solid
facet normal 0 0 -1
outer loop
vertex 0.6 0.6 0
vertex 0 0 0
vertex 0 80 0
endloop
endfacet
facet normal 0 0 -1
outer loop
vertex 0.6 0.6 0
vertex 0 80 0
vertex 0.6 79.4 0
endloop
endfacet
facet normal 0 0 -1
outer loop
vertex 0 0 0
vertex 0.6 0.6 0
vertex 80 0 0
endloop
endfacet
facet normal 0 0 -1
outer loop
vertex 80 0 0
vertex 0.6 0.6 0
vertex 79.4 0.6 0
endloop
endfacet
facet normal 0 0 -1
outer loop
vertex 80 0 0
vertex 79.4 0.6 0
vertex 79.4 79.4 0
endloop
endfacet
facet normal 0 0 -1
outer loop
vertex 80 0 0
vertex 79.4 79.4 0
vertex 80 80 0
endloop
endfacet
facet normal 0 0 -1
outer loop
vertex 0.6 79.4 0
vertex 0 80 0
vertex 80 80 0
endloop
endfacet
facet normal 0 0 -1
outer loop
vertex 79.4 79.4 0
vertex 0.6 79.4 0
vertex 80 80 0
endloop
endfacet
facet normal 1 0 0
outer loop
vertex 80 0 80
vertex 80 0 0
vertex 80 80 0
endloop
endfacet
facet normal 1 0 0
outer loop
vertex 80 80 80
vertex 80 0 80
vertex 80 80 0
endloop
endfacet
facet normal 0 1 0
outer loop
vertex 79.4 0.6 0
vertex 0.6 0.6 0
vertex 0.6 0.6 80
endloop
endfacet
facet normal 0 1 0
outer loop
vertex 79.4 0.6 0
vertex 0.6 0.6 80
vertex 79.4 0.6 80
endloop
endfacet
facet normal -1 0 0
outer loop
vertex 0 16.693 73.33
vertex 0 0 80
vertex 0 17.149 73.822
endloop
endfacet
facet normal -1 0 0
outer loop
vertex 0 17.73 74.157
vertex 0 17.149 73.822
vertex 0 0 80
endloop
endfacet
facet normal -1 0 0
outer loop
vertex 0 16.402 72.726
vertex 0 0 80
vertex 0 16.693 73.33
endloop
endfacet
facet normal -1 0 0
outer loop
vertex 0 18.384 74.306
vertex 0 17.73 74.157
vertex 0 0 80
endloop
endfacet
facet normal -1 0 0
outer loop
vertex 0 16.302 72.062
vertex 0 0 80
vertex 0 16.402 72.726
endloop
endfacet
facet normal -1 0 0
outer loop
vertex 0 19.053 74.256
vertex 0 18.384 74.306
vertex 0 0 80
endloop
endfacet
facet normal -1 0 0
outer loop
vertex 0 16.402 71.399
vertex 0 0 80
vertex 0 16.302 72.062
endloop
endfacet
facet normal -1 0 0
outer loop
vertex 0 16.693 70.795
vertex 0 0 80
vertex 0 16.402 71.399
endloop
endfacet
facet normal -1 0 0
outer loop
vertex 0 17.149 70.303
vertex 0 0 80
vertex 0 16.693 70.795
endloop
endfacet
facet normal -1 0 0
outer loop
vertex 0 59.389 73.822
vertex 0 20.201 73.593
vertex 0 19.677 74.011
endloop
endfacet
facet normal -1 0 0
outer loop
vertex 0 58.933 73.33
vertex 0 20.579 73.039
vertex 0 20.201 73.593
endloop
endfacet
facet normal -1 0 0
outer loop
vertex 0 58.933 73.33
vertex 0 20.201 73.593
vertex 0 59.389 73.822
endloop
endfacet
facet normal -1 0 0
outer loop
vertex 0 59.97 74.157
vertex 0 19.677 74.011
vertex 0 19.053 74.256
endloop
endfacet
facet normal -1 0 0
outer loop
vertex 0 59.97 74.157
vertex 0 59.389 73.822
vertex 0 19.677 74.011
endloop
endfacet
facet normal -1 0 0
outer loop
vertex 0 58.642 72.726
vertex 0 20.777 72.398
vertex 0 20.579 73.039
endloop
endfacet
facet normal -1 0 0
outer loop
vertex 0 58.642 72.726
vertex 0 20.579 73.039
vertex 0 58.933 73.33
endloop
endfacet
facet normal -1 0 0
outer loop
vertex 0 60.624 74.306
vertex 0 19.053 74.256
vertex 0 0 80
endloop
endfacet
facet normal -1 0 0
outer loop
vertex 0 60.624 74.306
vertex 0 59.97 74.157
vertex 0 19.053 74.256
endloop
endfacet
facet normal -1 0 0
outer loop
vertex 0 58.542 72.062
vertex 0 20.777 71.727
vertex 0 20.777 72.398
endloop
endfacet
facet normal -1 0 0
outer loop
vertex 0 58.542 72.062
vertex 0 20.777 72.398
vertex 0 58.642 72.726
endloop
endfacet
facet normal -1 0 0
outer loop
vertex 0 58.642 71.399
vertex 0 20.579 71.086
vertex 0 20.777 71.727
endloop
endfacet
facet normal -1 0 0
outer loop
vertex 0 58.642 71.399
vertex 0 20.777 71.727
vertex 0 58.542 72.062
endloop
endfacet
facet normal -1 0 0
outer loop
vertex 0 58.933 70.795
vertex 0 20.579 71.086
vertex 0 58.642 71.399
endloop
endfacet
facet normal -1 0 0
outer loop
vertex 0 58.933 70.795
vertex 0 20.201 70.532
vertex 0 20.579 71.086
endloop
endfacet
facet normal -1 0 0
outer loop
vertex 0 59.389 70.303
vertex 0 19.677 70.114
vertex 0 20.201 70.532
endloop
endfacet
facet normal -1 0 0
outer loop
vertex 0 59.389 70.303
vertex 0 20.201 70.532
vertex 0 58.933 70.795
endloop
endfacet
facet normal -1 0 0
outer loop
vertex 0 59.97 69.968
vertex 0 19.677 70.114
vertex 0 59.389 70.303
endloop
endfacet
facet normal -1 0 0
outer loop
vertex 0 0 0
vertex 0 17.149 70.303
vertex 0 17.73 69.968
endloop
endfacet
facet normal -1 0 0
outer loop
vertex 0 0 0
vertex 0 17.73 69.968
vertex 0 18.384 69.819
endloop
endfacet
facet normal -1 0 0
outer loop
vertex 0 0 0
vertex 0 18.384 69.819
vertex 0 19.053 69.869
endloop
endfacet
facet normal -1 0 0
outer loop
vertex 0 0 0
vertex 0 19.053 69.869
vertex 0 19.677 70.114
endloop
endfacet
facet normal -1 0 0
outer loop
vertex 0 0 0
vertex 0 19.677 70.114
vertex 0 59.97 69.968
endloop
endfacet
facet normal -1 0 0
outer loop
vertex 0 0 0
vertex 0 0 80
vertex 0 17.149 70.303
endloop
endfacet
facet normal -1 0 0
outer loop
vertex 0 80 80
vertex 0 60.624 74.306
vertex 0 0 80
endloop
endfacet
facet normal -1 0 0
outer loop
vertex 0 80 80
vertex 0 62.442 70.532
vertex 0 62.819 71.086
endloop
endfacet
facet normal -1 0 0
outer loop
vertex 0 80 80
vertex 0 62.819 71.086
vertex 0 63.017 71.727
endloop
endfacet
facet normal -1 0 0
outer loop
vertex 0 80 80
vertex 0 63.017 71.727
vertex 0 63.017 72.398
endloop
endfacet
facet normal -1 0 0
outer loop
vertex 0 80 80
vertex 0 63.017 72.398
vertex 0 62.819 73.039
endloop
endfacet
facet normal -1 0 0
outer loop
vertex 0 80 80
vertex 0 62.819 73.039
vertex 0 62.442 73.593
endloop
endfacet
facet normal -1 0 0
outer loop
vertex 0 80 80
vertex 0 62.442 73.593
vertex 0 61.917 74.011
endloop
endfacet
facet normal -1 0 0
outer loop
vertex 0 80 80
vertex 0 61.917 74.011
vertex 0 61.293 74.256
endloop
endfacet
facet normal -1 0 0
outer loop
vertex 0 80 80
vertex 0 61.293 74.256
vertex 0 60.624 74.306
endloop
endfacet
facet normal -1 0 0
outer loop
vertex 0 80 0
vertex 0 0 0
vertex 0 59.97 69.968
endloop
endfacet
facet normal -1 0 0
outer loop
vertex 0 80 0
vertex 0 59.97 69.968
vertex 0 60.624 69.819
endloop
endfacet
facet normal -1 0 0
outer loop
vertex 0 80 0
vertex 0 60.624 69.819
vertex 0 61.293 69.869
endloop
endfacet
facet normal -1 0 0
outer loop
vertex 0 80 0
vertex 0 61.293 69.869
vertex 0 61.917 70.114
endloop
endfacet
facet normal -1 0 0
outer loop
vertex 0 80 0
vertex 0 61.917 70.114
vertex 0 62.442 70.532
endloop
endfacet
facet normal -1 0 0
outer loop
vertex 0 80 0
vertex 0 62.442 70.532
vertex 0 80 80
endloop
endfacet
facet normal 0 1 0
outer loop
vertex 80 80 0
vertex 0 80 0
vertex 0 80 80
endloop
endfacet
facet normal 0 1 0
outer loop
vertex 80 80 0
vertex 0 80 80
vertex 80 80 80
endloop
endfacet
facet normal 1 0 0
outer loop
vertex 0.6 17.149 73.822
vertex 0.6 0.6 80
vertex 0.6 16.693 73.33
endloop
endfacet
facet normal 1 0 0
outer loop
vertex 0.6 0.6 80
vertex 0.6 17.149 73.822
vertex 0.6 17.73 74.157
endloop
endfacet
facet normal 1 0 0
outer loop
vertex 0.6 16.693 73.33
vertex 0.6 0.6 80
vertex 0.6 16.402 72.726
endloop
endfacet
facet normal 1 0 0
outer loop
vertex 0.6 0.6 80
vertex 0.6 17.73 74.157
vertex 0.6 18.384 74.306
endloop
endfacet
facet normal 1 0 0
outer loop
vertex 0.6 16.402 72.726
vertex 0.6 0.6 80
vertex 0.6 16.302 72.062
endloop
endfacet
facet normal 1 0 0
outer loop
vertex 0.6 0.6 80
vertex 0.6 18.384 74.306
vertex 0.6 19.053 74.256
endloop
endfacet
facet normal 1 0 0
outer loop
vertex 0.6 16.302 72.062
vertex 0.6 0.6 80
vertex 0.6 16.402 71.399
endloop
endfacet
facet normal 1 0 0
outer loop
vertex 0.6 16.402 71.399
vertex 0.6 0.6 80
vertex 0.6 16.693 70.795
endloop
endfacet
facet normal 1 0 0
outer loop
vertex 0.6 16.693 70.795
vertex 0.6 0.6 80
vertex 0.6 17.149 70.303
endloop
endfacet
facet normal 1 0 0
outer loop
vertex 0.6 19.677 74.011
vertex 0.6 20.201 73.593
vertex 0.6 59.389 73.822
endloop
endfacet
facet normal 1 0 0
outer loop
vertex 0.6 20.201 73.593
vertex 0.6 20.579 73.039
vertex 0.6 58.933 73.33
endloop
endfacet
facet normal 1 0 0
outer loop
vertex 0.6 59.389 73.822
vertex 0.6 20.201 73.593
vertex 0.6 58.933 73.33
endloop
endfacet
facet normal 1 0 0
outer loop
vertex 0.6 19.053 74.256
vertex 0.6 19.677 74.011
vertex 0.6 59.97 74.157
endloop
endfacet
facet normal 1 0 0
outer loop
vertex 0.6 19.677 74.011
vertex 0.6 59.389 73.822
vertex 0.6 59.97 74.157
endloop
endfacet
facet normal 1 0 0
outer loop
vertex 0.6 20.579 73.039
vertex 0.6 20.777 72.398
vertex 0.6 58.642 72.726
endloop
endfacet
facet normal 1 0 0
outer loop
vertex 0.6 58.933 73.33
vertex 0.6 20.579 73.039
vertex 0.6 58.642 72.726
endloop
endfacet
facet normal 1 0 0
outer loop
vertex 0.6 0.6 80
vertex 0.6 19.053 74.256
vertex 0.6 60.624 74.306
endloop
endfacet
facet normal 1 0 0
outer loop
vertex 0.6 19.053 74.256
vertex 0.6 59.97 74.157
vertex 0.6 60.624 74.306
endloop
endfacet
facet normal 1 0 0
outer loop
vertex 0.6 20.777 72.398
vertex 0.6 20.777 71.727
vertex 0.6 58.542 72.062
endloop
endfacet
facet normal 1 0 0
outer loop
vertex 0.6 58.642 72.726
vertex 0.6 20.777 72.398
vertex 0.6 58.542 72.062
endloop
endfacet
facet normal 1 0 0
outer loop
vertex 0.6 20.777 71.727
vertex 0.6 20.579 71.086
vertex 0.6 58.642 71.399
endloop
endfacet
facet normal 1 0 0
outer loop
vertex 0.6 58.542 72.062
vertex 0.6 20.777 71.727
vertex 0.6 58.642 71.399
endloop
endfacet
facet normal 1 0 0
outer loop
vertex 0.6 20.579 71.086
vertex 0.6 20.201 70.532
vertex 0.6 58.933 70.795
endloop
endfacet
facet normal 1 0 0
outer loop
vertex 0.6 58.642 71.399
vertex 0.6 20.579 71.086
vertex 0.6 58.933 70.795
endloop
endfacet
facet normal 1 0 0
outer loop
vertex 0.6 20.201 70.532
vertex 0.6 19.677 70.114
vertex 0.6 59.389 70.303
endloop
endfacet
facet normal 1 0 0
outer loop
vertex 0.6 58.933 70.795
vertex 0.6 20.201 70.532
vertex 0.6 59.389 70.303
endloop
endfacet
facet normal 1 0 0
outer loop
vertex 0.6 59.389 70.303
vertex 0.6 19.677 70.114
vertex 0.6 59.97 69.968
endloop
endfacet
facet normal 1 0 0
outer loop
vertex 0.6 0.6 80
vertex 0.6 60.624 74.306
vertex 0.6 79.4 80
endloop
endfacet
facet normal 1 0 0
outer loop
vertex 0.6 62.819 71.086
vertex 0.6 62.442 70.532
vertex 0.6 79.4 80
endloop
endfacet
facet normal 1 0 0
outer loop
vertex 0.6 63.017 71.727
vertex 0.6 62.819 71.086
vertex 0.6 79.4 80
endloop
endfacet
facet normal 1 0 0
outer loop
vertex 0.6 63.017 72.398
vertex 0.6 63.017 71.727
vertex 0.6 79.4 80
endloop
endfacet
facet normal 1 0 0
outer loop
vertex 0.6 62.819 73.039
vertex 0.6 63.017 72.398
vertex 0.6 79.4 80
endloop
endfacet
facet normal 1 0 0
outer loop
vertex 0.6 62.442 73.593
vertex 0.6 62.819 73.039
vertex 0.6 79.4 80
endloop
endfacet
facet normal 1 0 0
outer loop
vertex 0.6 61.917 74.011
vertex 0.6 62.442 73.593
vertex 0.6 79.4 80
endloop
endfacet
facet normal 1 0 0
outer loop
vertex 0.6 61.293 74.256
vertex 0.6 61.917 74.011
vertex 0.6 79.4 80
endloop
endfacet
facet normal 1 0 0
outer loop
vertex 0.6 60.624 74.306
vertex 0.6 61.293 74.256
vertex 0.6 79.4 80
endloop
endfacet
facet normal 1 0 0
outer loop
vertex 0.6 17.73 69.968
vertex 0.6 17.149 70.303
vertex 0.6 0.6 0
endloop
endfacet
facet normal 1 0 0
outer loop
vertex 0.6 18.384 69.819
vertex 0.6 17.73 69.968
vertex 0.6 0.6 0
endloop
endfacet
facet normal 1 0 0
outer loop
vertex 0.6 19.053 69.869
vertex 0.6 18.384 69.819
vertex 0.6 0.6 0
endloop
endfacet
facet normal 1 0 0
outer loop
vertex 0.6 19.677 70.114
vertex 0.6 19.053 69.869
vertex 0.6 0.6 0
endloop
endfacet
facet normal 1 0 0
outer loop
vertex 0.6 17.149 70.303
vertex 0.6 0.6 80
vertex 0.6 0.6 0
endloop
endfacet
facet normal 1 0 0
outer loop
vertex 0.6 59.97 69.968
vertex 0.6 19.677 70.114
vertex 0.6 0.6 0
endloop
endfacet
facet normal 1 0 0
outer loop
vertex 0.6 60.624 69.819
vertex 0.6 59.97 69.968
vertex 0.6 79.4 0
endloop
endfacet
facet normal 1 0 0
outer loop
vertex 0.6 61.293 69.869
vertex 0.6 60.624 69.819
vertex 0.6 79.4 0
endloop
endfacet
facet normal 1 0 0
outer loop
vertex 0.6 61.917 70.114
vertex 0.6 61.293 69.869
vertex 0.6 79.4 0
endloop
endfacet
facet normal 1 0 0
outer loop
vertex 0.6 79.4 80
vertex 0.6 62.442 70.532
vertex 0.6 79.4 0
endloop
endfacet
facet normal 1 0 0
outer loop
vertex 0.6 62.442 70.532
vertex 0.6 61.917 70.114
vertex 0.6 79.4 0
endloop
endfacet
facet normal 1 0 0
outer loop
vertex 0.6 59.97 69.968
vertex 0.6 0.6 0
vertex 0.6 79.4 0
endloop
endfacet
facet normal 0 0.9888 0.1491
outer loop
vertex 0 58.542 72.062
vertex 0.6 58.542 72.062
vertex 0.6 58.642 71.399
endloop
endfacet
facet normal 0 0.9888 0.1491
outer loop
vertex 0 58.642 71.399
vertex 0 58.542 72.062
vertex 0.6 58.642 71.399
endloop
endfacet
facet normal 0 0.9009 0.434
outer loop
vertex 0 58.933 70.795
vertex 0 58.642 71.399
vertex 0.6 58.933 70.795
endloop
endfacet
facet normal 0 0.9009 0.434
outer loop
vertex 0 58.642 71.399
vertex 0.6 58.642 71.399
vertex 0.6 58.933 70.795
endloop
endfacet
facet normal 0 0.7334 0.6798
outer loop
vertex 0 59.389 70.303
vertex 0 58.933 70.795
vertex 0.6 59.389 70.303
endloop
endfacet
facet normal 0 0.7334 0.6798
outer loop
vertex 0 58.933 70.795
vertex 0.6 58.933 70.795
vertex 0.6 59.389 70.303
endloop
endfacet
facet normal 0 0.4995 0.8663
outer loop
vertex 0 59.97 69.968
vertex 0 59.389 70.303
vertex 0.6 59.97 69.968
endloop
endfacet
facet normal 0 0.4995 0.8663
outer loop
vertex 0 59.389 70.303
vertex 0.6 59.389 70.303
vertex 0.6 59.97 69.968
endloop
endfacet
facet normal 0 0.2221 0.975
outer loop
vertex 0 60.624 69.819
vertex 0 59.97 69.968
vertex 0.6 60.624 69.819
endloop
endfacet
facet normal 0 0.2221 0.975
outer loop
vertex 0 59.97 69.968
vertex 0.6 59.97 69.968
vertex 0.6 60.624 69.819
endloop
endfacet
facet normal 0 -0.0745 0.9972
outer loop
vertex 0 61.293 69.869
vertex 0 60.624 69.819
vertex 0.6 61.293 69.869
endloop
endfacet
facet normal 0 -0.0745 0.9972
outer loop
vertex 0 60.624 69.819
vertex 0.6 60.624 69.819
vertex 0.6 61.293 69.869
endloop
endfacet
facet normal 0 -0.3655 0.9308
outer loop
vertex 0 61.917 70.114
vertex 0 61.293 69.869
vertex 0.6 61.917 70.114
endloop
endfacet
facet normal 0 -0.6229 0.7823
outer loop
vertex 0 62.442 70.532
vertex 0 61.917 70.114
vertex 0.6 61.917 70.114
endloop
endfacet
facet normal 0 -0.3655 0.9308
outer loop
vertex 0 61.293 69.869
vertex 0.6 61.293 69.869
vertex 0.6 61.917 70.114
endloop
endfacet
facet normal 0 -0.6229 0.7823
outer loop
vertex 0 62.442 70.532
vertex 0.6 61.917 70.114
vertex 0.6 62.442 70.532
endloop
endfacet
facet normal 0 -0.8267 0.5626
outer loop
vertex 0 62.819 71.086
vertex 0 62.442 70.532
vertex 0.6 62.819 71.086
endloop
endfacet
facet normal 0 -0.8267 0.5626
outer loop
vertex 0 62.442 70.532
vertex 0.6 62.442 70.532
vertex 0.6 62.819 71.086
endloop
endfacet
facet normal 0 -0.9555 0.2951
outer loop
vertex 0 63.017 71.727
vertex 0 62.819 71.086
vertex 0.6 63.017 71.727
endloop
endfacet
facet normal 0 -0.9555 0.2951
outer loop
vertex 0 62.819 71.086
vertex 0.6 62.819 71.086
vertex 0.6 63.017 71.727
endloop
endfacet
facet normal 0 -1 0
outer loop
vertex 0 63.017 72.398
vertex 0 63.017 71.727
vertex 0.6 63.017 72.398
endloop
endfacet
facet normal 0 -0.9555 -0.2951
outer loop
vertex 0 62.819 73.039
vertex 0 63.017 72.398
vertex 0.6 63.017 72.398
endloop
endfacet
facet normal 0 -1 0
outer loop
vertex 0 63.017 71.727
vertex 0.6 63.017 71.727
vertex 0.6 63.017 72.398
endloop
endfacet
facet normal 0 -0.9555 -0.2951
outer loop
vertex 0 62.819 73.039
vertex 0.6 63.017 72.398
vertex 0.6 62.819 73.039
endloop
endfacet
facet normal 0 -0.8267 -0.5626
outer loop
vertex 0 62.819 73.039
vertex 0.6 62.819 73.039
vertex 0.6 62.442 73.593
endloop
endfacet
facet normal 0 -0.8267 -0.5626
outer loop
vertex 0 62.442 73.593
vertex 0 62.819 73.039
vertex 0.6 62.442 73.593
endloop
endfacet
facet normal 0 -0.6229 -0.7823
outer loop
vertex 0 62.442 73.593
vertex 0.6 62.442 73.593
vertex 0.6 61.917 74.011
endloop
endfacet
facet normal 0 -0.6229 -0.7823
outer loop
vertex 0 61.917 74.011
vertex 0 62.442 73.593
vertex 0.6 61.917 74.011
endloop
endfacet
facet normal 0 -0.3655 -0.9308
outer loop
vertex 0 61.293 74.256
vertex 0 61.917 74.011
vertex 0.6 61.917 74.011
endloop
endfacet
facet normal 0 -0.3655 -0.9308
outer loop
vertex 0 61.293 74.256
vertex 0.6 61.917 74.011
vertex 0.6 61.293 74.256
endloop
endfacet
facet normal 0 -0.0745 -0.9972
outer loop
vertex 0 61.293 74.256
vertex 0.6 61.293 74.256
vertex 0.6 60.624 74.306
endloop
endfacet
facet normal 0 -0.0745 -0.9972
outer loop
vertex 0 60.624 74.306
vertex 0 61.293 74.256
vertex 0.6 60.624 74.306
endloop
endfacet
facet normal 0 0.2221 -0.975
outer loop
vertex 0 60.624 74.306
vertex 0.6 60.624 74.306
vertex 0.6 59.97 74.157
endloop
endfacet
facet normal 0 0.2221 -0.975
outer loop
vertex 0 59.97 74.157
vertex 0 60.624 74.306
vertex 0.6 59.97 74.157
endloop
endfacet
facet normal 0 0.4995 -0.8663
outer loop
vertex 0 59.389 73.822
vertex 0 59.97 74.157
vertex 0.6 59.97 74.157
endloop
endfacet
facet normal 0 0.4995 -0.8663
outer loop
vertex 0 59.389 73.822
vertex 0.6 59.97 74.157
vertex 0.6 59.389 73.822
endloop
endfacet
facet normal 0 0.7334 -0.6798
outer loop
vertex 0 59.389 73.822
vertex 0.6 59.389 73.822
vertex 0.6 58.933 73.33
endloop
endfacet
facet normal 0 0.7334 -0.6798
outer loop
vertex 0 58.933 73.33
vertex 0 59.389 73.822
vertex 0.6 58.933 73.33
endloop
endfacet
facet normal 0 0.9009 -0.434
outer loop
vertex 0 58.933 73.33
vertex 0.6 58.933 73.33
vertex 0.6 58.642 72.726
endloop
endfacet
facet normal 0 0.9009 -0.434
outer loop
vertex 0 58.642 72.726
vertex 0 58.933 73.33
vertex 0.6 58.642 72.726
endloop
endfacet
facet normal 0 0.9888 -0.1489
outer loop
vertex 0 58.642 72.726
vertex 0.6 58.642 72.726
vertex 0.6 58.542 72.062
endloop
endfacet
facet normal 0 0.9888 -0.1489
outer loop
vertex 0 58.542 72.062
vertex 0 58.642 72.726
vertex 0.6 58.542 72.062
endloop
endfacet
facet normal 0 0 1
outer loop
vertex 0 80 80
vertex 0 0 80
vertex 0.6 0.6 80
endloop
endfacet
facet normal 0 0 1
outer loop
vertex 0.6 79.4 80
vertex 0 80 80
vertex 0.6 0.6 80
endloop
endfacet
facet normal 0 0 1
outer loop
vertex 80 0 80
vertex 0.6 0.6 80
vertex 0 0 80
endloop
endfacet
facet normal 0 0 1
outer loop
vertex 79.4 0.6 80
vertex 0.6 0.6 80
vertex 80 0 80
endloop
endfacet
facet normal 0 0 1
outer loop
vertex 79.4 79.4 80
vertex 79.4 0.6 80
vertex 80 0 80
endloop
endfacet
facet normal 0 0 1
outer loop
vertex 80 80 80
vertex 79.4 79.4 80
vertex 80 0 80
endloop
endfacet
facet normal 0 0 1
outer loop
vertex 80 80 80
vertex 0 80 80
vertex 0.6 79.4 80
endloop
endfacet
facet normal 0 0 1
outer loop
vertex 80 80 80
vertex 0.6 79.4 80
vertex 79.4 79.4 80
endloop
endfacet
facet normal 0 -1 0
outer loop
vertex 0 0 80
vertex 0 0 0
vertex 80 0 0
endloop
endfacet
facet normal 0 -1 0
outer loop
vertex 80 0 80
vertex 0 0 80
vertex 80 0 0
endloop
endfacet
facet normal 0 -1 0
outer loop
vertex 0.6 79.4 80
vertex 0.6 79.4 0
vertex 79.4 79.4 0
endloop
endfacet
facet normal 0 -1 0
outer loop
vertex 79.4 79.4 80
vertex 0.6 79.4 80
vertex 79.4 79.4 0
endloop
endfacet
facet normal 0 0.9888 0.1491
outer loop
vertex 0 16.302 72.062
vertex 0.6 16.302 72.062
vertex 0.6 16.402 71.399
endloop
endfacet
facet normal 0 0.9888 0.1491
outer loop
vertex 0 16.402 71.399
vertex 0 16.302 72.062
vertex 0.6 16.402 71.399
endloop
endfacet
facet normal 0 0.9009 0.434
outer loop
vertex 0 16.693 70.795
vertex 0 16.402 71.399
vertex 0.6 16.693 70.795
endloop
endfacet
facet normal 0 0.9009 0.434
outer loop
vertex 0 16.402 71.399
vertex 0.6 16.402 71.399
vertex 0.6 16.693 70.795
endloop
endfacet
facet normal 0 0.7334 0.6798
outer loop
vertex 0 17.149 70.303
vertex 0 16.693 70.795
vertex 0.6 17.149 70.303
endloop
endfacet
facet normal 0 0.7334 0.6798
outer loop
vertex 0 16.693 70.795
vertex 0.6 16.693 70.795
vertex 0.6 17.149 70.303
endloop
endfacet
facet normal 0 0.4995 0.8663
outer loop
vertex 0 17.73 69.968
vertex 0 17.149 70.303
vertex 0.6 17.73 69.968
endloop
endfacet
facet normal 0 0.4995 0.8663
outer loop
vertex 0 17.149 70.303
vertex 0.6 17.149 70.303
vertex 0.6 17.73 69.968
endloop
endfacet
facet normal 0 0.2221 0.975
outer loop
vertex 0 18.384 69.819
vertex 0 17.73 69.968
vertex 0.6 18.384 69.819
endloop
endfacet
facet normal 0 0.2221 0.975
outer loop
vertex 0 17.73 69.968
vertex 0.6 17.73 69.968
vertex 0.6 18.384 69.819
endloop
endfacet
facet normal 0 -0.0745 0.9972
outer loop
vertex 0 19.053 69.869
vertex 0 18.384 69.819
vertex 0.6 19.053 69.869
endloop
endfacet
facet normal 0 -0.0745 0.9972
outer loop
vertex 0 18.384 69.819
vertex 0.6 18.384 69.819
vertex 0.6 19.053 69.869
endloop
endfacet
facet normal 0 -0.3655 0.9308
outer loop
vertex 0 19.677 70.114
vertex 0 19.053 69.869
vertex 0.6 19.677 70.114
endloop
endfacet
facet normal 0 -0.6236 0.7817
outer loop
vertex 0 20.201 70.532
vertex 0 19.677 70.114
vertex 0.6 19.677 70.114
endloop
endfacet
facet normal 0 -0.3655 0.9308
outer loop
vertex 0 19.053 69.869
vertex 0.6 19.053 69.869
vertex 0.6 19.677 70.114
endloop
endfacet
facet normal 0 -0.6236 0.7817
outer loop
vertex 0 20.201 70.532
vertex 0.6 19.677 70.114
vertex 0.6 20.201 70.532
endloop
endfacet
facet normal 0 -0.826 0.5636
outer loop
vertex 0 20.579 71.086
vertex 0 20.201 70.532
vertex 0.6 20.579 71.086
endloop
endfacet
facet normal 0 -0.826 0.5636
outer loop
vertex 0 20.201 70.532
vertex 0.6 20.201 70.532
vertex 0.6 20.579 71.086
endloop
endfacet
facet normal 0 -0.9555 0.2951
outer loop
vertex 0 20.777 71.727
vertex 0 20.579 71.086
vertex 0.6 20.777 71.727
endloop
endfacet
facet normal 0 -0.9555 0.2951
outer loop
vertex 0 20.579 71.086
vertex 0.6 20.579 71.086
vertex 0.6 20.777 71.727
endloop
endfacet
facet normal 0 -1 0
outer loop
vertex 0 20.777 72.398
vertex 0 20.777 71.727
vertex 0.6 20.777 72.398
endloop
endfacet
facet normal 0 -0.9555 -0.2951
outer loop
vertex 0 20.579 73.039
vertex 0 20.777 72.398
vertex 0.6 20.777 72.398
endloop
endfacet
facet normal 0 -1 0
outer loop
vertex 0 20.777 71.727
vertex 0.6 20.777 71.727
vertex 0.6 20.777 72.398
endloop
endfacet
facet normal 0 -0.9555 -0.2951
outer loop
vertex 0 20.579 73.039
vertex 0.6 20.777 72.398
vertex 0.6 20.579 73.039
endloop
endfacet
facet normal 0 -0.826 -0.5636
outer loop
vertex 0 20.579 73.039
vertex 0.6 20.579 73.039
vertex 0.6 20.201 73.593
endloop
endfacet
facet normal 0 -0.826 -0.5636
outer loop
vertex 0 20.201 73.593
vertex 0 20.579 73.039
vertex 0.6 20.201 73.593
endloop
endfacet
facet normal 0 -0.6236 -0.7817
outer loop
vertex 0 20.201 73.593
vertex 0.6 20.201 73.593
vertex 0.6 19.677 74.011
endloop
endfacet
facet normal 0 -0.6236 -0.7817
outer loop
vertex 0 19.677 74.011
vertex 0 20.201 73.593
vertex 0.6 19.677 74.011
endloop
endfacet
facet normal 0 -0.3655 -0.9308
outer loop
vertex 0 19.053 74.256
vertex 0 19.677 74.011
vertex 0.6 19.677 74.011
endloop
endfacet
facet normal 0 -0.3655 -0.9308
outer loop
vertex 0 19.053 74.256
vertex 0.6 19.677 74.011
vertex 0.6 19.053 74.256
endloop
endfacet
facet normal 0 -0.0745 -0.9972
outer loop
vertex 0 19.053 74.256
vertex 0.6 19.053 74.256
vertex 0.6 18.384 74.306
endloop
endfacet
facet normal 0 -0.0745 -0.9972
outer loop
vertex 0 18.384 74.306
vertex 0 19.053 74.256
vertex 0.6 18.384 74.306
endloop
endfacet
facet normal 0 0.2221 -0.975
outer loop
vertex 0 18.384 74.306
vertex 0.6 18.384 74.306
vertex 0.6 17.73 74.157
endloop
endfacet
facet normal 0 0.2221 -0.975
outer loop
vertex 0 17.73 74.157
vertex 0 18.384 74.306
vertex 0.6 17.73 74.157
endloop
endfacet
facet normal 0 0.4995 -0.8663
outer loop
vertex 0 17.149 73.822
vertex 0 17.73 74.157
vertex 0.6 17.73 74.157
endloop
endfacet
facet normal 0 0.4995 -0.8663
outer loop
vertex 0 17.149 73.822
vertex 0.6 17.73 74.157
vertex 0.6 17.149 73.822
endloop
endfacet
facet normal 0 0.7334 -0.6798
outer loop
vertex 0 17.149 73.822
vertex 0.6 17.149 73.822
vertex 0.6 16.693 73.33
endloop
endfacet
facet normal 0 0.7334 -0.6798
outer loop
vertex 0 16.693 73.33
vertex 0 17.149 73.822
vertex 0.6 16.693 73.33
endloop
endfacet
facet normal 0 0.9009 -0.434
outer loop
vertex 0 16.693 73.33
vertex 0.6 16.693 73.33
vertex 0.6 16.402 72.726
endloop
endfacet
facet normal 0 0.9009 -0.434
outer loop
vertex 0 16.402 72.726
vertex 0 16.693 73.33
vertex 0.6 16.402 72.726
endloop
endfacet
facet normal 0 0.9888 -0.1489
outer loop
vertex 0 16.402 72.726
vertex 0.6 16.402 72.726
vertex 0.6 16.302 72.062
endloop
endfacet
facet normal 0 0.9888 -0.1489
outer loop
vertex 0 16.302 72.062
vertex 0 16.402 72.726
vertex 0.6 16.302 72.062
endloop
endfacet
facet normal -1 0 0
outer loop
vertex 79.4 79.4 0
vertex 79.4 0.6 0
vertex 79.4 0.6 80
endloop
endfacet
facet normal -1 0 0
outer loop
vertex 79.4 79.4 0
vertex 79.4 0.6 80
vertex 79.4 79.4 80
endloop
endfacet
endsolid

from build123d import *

# Parameters (mm, degrees)
CROQUIS1_W                       = 80
CROQUIS1_H                       = 80
SALIENTE_EXTRUIR1_DEPTH          = 80
VACIADO1_T                       = -0.6
TALADRO_DE_MARGEN_PARA_M41_D     = 4.5
TALADRO_DE_MARGEN_PARA_M41_DEPTH = 5


with BuildPart() as part:
    # Croquis1 → Saliente-Extruir1 (new body)
    with BuildSketch(Plane.XY):
        with Locations((40, 40)):
            Rectangle(CROQUIS1_W, CROQUIS1_H)
    extrude(amount=SALIENTE_EXTRUIR1_DEPTH)

    # Vaciado1
    vaciado1_openings = [part.faces().sort_by_distance(p)[0] for p in [
        (40, 40, 80),
        (40, 40, 0),
    ]]
    offset(amount=VACIADO1_T, openings=vaciado1_openings, kind=Kind.INTERSECTION)

    # Taladro de margen para M41
    with Locations(Plane(origin=(0, -79.637122061, 0), x_dir=(0, 1, 0), z_dir=(-1, 0, 0))):
        with Locations((98.1889532, -72.0625), (140.429406251, -72.0625)):
            Hole(TALADRO_DE_MARGEN_PARA_M41_D / 2, depth=TALADRO_DE_MARGEN_PARA_M41_DEPTH)


solid = part.part
